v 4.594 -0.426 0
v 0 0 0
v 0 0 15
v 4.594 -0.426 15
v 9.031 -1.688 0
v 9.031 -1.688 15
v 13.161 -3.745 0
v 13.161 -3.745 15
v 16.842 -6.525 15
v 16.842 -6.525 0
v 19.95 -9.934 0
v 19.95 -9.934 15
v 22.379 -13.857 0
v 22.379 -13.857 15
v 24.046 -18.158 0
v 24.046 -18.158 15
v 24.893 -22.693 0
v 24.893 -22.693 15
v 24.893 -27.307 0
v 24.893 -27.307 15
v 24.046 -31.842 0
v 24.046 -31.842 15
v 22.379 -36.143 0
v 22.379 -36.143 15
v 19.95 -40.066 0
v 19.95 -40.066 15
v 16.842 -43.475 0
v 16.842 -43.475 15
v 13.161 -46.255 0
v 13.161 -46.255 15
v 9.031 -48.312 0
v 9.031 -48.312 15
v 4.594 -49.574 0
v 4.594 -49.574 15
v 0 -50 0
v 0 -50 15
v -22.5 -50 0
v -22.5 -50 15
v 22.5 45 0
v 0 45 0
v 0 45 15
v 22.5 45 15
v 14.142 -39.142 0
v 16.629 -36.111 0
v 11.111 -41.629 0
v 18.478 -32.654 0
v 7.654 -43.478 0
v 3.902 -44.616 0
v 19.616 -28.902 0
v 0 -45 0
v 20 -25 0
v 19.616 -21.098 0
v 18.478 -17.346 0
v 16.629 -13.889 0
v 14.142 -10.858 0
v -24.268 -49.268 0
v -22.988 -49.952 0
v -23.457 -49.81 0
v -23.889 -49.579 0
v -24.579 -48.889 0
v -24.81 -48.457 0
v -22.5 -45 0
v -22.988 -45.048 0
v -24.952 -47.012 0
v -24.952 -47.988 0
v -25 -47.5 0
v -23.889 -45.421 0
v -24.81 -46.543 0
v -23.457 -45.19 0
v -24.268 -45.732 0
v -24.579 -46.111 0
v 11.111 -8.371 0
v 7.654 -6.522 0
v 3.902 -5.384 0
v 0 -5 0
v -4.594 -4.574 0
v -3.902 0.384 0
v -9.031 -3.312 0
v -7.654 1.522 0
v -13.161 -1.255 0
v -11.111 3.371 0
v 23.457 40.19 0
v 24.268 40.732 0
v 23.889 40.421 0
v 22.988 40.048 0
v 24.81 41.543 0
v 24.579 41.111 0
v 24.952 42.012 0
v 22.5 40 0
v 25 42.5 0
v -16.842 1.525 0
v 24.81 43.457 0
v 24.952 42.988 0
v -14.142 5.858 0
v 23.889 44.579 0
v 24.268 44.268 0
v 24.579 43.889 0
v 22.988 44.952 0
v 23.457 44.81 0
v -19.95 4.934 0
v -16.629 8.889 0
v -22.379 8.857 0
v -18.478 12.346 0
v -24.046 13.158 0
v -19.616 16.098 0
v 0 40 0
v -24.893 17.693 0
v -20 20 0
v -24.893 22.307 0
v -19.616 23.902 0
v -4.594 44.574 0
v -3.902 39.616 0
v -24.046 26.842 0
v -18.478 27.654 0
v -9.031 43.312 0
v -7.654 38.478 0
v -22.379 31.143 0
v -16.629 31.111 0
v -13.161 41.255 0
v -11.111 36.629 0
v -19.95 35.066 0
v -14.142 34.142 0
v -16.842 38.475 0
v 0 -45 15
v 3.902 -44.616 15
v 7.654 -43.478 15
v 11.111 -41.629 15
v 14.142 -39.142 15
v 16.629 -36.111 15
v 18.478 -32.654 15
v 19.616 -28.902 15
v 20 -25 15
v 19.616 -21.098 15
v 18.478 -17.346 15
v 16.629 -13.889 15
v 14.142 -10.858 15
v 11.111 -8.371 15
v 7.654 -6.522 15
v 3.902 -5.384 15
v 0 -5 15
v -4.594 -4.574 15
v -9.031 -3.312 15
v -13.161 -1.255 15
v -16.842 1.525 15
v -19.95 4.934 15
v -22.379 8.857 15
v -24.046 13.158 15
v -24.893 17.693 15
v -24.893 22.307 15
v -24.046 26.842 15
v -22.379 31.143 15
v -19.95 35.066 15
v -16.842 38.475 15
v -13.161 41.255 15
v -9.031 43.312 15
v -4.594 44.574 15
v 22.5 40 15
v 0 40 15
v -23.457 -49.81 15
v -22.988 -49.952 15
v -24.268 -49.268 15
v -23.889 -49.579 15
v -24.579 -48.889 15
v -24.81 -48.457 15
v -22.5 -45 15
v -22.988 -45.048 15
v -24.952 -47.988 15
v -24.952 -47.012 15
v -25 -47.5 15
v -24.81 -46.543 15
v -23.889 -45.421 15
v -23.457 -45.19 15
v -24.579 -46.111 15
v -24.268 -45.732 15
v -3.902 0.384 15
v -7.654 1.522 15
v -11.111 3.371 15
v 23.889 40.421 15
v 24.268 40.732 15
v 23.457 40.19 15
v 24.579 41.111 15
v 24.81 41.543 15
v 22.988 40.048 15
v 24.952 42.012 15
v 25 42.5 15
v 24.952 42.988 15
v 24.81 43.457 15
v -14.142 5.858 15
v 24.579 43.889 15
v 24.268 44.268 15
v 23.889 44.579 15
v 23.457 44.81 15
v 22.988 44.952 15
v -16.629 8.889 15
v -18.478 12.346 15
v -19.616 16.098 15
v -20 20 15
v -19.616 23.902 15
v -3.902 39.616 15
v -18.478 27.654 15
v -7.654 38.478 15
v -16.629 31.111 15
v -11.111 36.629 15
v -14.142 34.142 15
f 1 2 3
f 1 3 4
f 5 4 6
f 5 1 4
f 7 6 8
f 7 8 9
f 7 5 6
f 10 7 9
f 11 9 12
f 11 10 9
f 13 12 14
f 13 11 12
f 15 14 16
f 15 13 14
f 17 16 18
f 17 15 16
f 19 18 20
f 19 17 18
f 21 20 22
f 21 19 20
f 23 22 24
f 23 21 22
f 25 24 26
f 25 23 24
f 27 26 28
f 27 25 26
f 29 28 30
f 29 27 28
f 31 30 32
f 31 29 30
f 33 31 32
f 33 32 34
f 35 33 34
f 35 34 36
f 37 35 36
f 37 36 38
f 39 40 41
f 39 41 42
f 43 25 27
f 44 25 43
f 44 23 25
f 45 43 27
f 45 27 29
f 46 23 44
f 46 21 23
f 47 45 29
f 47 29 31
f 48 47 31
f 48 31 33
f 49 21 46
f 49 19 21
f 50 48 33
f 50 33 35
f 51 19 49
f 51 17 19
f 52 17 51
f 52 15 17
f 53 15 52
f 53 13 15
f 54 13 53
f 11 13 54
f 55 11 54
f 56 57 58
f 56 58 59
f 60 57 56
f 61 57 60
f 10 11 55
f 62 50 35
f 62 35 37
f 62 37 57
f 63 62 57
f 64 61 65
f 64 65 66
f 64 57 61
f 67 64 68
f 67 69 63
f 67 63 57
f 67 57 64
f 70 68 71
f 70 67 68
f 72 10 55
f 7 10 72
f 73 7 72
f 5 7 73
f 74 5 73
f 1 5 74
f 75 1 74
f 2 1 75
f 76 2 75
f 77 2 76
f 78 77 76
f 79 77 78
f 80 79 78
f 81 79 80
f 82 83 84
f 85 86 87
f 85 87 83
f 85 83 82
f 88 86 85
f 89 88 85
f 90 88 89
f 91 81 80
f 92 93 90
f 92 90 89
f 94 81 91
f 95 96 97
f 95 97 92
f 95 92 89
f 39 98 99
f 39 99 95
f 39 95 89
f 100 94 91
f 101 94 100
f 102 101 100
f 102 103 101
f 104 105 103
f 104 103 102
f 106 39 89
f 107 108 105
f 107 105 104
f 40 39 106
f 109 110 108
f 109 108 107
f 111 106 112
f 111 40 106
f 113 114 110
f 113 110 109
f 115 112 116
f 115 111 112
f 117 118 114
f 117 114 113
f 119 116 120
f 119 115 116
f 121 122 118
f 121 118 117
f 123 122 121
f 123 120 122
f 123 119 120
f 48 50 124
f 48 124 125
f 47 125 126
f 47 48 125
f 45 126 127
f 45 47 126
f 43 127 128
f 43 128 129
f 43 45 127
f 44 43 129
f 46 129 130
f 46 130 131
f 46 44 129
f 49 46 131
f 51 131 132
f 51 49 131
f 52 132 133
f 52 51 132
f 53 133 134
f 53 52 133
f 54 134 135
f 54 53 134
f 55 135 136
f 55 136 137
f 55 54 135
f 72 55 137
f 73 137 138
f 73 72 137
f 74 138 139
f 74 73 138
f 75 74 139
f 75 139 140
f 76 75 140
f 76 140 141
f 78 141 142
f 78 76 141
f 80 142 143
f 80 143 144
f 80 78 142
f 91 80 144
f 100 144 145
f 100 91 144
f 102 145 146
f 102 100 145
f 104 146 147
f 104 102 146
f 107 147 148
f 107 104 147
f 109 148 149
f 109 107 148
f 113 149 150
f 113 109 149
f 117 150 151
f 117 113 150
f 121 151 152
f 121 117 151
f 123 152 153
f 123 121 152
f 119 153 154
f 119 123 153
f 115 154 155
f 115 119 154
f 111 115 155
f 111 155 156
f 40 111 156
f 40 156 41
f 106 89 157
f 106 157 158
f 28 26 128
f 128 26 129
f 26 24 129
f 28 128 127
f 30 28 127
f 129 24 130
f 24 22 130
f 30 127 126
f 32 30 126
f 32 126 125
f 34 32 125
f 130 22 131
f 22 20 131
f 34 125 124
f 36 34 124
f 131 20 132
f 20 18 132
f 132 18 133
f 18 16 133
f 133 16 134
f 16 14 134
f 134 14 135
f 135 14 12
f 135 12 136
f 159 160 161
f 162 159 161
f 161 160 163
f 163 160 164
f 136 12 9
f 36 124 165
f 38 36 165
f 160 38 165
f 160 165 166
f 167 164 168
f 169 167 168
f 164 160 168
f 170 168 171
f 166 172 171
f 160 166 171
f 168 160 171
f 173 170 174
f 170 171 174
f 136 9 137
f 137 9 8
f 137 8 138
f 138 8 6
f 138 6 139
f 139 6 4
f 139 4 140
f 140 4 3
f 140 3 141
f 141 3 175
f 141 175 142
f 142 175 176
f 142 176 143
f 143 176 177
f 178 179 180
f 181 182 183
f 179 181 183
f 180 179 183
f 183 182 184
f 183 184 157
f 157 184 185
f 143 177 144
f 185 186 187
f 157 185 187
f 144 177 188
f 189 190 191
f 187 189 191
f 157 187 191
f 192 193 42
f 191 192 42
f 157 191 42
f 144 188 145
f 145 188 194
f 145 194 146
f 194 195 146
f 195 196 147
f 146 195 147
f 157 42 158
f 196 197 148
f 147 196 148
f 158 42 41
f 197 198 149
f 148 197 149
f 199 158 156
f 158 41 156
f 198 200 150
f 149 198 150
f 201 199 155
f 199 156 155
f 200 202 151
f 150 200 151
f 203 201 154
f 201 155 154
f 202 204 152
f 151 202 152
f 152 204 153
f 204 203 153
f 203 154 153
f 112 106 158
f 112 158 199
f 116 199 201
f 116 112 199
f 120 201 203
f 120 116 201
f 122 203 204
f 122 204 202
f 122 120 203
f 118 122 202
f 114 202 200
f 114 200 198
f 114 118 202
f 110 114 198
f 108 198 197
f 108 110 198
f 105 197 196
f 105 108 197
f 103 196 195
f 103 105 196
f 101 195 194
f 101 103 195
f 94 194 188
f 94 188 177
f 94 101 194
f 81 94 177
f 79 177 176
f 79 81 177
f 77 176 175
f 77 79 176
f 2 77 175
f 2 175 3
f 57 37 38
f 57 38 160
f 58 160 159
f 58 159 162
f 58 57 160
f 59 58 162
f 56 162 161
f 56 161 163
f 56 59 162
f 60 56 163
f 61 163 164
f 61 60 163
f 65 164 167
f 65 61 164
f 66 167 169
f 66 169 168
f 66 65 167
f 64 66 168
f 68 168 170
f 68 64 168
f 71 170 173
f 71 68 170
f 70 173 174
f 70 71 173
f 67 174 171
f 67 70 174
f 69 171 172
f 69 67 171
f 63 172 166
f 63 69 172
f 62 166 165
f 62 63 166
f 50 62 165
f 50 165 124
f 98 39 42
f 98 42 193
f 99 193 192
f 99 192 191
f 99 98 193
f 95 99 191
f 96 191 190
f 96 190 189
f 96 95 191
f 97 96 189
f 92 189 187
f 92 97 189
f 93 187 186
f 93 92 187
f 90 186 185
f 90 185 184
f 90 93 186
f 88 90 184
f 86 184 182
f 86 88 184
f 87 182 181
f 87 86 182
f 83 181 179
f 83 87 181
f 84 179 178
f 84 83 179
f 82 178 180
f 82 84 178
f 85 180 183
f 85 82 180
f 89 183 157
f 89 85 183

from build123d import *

# Parameters (mm, degrees)
Y_KSEKLIK_EKSTR_ZYON2_DEPTH = 15


with BuildPart() as part:
    # Çizim3 → Yükseklik-Ekstrüzyon2 (new body)
    with BuildSketch(Plane.XY):
        with BuildLine():
            Line((0, 45), (22.5, 45))
            ThreePointArc((22.5, 45), (25, 42.5), (22.5, 40))
            Line((22.5, 40), (0, 40))
            ThreePointArc((0, 40), (-20, 20), (0, 0))
            ThreePointArc((0, 0), (25, -25), (0, -50))
            Line((0, -50), (-22.5, -50))
            ThreePointArc((-22.5, -50), (-25, -47.5), (-22.5, -45))
            Line((-22.5, -45), (0, -45))
            ThreePointArc((0, -45), (20, -25), (0, -5))
            ThreePointArc((0, -5), (-25, 20), (0, 45))
        make_face()
    extrude(amount=Y_KSEKLIK_EKSTR_ZYON2_DEPTH)


solid = part.part
